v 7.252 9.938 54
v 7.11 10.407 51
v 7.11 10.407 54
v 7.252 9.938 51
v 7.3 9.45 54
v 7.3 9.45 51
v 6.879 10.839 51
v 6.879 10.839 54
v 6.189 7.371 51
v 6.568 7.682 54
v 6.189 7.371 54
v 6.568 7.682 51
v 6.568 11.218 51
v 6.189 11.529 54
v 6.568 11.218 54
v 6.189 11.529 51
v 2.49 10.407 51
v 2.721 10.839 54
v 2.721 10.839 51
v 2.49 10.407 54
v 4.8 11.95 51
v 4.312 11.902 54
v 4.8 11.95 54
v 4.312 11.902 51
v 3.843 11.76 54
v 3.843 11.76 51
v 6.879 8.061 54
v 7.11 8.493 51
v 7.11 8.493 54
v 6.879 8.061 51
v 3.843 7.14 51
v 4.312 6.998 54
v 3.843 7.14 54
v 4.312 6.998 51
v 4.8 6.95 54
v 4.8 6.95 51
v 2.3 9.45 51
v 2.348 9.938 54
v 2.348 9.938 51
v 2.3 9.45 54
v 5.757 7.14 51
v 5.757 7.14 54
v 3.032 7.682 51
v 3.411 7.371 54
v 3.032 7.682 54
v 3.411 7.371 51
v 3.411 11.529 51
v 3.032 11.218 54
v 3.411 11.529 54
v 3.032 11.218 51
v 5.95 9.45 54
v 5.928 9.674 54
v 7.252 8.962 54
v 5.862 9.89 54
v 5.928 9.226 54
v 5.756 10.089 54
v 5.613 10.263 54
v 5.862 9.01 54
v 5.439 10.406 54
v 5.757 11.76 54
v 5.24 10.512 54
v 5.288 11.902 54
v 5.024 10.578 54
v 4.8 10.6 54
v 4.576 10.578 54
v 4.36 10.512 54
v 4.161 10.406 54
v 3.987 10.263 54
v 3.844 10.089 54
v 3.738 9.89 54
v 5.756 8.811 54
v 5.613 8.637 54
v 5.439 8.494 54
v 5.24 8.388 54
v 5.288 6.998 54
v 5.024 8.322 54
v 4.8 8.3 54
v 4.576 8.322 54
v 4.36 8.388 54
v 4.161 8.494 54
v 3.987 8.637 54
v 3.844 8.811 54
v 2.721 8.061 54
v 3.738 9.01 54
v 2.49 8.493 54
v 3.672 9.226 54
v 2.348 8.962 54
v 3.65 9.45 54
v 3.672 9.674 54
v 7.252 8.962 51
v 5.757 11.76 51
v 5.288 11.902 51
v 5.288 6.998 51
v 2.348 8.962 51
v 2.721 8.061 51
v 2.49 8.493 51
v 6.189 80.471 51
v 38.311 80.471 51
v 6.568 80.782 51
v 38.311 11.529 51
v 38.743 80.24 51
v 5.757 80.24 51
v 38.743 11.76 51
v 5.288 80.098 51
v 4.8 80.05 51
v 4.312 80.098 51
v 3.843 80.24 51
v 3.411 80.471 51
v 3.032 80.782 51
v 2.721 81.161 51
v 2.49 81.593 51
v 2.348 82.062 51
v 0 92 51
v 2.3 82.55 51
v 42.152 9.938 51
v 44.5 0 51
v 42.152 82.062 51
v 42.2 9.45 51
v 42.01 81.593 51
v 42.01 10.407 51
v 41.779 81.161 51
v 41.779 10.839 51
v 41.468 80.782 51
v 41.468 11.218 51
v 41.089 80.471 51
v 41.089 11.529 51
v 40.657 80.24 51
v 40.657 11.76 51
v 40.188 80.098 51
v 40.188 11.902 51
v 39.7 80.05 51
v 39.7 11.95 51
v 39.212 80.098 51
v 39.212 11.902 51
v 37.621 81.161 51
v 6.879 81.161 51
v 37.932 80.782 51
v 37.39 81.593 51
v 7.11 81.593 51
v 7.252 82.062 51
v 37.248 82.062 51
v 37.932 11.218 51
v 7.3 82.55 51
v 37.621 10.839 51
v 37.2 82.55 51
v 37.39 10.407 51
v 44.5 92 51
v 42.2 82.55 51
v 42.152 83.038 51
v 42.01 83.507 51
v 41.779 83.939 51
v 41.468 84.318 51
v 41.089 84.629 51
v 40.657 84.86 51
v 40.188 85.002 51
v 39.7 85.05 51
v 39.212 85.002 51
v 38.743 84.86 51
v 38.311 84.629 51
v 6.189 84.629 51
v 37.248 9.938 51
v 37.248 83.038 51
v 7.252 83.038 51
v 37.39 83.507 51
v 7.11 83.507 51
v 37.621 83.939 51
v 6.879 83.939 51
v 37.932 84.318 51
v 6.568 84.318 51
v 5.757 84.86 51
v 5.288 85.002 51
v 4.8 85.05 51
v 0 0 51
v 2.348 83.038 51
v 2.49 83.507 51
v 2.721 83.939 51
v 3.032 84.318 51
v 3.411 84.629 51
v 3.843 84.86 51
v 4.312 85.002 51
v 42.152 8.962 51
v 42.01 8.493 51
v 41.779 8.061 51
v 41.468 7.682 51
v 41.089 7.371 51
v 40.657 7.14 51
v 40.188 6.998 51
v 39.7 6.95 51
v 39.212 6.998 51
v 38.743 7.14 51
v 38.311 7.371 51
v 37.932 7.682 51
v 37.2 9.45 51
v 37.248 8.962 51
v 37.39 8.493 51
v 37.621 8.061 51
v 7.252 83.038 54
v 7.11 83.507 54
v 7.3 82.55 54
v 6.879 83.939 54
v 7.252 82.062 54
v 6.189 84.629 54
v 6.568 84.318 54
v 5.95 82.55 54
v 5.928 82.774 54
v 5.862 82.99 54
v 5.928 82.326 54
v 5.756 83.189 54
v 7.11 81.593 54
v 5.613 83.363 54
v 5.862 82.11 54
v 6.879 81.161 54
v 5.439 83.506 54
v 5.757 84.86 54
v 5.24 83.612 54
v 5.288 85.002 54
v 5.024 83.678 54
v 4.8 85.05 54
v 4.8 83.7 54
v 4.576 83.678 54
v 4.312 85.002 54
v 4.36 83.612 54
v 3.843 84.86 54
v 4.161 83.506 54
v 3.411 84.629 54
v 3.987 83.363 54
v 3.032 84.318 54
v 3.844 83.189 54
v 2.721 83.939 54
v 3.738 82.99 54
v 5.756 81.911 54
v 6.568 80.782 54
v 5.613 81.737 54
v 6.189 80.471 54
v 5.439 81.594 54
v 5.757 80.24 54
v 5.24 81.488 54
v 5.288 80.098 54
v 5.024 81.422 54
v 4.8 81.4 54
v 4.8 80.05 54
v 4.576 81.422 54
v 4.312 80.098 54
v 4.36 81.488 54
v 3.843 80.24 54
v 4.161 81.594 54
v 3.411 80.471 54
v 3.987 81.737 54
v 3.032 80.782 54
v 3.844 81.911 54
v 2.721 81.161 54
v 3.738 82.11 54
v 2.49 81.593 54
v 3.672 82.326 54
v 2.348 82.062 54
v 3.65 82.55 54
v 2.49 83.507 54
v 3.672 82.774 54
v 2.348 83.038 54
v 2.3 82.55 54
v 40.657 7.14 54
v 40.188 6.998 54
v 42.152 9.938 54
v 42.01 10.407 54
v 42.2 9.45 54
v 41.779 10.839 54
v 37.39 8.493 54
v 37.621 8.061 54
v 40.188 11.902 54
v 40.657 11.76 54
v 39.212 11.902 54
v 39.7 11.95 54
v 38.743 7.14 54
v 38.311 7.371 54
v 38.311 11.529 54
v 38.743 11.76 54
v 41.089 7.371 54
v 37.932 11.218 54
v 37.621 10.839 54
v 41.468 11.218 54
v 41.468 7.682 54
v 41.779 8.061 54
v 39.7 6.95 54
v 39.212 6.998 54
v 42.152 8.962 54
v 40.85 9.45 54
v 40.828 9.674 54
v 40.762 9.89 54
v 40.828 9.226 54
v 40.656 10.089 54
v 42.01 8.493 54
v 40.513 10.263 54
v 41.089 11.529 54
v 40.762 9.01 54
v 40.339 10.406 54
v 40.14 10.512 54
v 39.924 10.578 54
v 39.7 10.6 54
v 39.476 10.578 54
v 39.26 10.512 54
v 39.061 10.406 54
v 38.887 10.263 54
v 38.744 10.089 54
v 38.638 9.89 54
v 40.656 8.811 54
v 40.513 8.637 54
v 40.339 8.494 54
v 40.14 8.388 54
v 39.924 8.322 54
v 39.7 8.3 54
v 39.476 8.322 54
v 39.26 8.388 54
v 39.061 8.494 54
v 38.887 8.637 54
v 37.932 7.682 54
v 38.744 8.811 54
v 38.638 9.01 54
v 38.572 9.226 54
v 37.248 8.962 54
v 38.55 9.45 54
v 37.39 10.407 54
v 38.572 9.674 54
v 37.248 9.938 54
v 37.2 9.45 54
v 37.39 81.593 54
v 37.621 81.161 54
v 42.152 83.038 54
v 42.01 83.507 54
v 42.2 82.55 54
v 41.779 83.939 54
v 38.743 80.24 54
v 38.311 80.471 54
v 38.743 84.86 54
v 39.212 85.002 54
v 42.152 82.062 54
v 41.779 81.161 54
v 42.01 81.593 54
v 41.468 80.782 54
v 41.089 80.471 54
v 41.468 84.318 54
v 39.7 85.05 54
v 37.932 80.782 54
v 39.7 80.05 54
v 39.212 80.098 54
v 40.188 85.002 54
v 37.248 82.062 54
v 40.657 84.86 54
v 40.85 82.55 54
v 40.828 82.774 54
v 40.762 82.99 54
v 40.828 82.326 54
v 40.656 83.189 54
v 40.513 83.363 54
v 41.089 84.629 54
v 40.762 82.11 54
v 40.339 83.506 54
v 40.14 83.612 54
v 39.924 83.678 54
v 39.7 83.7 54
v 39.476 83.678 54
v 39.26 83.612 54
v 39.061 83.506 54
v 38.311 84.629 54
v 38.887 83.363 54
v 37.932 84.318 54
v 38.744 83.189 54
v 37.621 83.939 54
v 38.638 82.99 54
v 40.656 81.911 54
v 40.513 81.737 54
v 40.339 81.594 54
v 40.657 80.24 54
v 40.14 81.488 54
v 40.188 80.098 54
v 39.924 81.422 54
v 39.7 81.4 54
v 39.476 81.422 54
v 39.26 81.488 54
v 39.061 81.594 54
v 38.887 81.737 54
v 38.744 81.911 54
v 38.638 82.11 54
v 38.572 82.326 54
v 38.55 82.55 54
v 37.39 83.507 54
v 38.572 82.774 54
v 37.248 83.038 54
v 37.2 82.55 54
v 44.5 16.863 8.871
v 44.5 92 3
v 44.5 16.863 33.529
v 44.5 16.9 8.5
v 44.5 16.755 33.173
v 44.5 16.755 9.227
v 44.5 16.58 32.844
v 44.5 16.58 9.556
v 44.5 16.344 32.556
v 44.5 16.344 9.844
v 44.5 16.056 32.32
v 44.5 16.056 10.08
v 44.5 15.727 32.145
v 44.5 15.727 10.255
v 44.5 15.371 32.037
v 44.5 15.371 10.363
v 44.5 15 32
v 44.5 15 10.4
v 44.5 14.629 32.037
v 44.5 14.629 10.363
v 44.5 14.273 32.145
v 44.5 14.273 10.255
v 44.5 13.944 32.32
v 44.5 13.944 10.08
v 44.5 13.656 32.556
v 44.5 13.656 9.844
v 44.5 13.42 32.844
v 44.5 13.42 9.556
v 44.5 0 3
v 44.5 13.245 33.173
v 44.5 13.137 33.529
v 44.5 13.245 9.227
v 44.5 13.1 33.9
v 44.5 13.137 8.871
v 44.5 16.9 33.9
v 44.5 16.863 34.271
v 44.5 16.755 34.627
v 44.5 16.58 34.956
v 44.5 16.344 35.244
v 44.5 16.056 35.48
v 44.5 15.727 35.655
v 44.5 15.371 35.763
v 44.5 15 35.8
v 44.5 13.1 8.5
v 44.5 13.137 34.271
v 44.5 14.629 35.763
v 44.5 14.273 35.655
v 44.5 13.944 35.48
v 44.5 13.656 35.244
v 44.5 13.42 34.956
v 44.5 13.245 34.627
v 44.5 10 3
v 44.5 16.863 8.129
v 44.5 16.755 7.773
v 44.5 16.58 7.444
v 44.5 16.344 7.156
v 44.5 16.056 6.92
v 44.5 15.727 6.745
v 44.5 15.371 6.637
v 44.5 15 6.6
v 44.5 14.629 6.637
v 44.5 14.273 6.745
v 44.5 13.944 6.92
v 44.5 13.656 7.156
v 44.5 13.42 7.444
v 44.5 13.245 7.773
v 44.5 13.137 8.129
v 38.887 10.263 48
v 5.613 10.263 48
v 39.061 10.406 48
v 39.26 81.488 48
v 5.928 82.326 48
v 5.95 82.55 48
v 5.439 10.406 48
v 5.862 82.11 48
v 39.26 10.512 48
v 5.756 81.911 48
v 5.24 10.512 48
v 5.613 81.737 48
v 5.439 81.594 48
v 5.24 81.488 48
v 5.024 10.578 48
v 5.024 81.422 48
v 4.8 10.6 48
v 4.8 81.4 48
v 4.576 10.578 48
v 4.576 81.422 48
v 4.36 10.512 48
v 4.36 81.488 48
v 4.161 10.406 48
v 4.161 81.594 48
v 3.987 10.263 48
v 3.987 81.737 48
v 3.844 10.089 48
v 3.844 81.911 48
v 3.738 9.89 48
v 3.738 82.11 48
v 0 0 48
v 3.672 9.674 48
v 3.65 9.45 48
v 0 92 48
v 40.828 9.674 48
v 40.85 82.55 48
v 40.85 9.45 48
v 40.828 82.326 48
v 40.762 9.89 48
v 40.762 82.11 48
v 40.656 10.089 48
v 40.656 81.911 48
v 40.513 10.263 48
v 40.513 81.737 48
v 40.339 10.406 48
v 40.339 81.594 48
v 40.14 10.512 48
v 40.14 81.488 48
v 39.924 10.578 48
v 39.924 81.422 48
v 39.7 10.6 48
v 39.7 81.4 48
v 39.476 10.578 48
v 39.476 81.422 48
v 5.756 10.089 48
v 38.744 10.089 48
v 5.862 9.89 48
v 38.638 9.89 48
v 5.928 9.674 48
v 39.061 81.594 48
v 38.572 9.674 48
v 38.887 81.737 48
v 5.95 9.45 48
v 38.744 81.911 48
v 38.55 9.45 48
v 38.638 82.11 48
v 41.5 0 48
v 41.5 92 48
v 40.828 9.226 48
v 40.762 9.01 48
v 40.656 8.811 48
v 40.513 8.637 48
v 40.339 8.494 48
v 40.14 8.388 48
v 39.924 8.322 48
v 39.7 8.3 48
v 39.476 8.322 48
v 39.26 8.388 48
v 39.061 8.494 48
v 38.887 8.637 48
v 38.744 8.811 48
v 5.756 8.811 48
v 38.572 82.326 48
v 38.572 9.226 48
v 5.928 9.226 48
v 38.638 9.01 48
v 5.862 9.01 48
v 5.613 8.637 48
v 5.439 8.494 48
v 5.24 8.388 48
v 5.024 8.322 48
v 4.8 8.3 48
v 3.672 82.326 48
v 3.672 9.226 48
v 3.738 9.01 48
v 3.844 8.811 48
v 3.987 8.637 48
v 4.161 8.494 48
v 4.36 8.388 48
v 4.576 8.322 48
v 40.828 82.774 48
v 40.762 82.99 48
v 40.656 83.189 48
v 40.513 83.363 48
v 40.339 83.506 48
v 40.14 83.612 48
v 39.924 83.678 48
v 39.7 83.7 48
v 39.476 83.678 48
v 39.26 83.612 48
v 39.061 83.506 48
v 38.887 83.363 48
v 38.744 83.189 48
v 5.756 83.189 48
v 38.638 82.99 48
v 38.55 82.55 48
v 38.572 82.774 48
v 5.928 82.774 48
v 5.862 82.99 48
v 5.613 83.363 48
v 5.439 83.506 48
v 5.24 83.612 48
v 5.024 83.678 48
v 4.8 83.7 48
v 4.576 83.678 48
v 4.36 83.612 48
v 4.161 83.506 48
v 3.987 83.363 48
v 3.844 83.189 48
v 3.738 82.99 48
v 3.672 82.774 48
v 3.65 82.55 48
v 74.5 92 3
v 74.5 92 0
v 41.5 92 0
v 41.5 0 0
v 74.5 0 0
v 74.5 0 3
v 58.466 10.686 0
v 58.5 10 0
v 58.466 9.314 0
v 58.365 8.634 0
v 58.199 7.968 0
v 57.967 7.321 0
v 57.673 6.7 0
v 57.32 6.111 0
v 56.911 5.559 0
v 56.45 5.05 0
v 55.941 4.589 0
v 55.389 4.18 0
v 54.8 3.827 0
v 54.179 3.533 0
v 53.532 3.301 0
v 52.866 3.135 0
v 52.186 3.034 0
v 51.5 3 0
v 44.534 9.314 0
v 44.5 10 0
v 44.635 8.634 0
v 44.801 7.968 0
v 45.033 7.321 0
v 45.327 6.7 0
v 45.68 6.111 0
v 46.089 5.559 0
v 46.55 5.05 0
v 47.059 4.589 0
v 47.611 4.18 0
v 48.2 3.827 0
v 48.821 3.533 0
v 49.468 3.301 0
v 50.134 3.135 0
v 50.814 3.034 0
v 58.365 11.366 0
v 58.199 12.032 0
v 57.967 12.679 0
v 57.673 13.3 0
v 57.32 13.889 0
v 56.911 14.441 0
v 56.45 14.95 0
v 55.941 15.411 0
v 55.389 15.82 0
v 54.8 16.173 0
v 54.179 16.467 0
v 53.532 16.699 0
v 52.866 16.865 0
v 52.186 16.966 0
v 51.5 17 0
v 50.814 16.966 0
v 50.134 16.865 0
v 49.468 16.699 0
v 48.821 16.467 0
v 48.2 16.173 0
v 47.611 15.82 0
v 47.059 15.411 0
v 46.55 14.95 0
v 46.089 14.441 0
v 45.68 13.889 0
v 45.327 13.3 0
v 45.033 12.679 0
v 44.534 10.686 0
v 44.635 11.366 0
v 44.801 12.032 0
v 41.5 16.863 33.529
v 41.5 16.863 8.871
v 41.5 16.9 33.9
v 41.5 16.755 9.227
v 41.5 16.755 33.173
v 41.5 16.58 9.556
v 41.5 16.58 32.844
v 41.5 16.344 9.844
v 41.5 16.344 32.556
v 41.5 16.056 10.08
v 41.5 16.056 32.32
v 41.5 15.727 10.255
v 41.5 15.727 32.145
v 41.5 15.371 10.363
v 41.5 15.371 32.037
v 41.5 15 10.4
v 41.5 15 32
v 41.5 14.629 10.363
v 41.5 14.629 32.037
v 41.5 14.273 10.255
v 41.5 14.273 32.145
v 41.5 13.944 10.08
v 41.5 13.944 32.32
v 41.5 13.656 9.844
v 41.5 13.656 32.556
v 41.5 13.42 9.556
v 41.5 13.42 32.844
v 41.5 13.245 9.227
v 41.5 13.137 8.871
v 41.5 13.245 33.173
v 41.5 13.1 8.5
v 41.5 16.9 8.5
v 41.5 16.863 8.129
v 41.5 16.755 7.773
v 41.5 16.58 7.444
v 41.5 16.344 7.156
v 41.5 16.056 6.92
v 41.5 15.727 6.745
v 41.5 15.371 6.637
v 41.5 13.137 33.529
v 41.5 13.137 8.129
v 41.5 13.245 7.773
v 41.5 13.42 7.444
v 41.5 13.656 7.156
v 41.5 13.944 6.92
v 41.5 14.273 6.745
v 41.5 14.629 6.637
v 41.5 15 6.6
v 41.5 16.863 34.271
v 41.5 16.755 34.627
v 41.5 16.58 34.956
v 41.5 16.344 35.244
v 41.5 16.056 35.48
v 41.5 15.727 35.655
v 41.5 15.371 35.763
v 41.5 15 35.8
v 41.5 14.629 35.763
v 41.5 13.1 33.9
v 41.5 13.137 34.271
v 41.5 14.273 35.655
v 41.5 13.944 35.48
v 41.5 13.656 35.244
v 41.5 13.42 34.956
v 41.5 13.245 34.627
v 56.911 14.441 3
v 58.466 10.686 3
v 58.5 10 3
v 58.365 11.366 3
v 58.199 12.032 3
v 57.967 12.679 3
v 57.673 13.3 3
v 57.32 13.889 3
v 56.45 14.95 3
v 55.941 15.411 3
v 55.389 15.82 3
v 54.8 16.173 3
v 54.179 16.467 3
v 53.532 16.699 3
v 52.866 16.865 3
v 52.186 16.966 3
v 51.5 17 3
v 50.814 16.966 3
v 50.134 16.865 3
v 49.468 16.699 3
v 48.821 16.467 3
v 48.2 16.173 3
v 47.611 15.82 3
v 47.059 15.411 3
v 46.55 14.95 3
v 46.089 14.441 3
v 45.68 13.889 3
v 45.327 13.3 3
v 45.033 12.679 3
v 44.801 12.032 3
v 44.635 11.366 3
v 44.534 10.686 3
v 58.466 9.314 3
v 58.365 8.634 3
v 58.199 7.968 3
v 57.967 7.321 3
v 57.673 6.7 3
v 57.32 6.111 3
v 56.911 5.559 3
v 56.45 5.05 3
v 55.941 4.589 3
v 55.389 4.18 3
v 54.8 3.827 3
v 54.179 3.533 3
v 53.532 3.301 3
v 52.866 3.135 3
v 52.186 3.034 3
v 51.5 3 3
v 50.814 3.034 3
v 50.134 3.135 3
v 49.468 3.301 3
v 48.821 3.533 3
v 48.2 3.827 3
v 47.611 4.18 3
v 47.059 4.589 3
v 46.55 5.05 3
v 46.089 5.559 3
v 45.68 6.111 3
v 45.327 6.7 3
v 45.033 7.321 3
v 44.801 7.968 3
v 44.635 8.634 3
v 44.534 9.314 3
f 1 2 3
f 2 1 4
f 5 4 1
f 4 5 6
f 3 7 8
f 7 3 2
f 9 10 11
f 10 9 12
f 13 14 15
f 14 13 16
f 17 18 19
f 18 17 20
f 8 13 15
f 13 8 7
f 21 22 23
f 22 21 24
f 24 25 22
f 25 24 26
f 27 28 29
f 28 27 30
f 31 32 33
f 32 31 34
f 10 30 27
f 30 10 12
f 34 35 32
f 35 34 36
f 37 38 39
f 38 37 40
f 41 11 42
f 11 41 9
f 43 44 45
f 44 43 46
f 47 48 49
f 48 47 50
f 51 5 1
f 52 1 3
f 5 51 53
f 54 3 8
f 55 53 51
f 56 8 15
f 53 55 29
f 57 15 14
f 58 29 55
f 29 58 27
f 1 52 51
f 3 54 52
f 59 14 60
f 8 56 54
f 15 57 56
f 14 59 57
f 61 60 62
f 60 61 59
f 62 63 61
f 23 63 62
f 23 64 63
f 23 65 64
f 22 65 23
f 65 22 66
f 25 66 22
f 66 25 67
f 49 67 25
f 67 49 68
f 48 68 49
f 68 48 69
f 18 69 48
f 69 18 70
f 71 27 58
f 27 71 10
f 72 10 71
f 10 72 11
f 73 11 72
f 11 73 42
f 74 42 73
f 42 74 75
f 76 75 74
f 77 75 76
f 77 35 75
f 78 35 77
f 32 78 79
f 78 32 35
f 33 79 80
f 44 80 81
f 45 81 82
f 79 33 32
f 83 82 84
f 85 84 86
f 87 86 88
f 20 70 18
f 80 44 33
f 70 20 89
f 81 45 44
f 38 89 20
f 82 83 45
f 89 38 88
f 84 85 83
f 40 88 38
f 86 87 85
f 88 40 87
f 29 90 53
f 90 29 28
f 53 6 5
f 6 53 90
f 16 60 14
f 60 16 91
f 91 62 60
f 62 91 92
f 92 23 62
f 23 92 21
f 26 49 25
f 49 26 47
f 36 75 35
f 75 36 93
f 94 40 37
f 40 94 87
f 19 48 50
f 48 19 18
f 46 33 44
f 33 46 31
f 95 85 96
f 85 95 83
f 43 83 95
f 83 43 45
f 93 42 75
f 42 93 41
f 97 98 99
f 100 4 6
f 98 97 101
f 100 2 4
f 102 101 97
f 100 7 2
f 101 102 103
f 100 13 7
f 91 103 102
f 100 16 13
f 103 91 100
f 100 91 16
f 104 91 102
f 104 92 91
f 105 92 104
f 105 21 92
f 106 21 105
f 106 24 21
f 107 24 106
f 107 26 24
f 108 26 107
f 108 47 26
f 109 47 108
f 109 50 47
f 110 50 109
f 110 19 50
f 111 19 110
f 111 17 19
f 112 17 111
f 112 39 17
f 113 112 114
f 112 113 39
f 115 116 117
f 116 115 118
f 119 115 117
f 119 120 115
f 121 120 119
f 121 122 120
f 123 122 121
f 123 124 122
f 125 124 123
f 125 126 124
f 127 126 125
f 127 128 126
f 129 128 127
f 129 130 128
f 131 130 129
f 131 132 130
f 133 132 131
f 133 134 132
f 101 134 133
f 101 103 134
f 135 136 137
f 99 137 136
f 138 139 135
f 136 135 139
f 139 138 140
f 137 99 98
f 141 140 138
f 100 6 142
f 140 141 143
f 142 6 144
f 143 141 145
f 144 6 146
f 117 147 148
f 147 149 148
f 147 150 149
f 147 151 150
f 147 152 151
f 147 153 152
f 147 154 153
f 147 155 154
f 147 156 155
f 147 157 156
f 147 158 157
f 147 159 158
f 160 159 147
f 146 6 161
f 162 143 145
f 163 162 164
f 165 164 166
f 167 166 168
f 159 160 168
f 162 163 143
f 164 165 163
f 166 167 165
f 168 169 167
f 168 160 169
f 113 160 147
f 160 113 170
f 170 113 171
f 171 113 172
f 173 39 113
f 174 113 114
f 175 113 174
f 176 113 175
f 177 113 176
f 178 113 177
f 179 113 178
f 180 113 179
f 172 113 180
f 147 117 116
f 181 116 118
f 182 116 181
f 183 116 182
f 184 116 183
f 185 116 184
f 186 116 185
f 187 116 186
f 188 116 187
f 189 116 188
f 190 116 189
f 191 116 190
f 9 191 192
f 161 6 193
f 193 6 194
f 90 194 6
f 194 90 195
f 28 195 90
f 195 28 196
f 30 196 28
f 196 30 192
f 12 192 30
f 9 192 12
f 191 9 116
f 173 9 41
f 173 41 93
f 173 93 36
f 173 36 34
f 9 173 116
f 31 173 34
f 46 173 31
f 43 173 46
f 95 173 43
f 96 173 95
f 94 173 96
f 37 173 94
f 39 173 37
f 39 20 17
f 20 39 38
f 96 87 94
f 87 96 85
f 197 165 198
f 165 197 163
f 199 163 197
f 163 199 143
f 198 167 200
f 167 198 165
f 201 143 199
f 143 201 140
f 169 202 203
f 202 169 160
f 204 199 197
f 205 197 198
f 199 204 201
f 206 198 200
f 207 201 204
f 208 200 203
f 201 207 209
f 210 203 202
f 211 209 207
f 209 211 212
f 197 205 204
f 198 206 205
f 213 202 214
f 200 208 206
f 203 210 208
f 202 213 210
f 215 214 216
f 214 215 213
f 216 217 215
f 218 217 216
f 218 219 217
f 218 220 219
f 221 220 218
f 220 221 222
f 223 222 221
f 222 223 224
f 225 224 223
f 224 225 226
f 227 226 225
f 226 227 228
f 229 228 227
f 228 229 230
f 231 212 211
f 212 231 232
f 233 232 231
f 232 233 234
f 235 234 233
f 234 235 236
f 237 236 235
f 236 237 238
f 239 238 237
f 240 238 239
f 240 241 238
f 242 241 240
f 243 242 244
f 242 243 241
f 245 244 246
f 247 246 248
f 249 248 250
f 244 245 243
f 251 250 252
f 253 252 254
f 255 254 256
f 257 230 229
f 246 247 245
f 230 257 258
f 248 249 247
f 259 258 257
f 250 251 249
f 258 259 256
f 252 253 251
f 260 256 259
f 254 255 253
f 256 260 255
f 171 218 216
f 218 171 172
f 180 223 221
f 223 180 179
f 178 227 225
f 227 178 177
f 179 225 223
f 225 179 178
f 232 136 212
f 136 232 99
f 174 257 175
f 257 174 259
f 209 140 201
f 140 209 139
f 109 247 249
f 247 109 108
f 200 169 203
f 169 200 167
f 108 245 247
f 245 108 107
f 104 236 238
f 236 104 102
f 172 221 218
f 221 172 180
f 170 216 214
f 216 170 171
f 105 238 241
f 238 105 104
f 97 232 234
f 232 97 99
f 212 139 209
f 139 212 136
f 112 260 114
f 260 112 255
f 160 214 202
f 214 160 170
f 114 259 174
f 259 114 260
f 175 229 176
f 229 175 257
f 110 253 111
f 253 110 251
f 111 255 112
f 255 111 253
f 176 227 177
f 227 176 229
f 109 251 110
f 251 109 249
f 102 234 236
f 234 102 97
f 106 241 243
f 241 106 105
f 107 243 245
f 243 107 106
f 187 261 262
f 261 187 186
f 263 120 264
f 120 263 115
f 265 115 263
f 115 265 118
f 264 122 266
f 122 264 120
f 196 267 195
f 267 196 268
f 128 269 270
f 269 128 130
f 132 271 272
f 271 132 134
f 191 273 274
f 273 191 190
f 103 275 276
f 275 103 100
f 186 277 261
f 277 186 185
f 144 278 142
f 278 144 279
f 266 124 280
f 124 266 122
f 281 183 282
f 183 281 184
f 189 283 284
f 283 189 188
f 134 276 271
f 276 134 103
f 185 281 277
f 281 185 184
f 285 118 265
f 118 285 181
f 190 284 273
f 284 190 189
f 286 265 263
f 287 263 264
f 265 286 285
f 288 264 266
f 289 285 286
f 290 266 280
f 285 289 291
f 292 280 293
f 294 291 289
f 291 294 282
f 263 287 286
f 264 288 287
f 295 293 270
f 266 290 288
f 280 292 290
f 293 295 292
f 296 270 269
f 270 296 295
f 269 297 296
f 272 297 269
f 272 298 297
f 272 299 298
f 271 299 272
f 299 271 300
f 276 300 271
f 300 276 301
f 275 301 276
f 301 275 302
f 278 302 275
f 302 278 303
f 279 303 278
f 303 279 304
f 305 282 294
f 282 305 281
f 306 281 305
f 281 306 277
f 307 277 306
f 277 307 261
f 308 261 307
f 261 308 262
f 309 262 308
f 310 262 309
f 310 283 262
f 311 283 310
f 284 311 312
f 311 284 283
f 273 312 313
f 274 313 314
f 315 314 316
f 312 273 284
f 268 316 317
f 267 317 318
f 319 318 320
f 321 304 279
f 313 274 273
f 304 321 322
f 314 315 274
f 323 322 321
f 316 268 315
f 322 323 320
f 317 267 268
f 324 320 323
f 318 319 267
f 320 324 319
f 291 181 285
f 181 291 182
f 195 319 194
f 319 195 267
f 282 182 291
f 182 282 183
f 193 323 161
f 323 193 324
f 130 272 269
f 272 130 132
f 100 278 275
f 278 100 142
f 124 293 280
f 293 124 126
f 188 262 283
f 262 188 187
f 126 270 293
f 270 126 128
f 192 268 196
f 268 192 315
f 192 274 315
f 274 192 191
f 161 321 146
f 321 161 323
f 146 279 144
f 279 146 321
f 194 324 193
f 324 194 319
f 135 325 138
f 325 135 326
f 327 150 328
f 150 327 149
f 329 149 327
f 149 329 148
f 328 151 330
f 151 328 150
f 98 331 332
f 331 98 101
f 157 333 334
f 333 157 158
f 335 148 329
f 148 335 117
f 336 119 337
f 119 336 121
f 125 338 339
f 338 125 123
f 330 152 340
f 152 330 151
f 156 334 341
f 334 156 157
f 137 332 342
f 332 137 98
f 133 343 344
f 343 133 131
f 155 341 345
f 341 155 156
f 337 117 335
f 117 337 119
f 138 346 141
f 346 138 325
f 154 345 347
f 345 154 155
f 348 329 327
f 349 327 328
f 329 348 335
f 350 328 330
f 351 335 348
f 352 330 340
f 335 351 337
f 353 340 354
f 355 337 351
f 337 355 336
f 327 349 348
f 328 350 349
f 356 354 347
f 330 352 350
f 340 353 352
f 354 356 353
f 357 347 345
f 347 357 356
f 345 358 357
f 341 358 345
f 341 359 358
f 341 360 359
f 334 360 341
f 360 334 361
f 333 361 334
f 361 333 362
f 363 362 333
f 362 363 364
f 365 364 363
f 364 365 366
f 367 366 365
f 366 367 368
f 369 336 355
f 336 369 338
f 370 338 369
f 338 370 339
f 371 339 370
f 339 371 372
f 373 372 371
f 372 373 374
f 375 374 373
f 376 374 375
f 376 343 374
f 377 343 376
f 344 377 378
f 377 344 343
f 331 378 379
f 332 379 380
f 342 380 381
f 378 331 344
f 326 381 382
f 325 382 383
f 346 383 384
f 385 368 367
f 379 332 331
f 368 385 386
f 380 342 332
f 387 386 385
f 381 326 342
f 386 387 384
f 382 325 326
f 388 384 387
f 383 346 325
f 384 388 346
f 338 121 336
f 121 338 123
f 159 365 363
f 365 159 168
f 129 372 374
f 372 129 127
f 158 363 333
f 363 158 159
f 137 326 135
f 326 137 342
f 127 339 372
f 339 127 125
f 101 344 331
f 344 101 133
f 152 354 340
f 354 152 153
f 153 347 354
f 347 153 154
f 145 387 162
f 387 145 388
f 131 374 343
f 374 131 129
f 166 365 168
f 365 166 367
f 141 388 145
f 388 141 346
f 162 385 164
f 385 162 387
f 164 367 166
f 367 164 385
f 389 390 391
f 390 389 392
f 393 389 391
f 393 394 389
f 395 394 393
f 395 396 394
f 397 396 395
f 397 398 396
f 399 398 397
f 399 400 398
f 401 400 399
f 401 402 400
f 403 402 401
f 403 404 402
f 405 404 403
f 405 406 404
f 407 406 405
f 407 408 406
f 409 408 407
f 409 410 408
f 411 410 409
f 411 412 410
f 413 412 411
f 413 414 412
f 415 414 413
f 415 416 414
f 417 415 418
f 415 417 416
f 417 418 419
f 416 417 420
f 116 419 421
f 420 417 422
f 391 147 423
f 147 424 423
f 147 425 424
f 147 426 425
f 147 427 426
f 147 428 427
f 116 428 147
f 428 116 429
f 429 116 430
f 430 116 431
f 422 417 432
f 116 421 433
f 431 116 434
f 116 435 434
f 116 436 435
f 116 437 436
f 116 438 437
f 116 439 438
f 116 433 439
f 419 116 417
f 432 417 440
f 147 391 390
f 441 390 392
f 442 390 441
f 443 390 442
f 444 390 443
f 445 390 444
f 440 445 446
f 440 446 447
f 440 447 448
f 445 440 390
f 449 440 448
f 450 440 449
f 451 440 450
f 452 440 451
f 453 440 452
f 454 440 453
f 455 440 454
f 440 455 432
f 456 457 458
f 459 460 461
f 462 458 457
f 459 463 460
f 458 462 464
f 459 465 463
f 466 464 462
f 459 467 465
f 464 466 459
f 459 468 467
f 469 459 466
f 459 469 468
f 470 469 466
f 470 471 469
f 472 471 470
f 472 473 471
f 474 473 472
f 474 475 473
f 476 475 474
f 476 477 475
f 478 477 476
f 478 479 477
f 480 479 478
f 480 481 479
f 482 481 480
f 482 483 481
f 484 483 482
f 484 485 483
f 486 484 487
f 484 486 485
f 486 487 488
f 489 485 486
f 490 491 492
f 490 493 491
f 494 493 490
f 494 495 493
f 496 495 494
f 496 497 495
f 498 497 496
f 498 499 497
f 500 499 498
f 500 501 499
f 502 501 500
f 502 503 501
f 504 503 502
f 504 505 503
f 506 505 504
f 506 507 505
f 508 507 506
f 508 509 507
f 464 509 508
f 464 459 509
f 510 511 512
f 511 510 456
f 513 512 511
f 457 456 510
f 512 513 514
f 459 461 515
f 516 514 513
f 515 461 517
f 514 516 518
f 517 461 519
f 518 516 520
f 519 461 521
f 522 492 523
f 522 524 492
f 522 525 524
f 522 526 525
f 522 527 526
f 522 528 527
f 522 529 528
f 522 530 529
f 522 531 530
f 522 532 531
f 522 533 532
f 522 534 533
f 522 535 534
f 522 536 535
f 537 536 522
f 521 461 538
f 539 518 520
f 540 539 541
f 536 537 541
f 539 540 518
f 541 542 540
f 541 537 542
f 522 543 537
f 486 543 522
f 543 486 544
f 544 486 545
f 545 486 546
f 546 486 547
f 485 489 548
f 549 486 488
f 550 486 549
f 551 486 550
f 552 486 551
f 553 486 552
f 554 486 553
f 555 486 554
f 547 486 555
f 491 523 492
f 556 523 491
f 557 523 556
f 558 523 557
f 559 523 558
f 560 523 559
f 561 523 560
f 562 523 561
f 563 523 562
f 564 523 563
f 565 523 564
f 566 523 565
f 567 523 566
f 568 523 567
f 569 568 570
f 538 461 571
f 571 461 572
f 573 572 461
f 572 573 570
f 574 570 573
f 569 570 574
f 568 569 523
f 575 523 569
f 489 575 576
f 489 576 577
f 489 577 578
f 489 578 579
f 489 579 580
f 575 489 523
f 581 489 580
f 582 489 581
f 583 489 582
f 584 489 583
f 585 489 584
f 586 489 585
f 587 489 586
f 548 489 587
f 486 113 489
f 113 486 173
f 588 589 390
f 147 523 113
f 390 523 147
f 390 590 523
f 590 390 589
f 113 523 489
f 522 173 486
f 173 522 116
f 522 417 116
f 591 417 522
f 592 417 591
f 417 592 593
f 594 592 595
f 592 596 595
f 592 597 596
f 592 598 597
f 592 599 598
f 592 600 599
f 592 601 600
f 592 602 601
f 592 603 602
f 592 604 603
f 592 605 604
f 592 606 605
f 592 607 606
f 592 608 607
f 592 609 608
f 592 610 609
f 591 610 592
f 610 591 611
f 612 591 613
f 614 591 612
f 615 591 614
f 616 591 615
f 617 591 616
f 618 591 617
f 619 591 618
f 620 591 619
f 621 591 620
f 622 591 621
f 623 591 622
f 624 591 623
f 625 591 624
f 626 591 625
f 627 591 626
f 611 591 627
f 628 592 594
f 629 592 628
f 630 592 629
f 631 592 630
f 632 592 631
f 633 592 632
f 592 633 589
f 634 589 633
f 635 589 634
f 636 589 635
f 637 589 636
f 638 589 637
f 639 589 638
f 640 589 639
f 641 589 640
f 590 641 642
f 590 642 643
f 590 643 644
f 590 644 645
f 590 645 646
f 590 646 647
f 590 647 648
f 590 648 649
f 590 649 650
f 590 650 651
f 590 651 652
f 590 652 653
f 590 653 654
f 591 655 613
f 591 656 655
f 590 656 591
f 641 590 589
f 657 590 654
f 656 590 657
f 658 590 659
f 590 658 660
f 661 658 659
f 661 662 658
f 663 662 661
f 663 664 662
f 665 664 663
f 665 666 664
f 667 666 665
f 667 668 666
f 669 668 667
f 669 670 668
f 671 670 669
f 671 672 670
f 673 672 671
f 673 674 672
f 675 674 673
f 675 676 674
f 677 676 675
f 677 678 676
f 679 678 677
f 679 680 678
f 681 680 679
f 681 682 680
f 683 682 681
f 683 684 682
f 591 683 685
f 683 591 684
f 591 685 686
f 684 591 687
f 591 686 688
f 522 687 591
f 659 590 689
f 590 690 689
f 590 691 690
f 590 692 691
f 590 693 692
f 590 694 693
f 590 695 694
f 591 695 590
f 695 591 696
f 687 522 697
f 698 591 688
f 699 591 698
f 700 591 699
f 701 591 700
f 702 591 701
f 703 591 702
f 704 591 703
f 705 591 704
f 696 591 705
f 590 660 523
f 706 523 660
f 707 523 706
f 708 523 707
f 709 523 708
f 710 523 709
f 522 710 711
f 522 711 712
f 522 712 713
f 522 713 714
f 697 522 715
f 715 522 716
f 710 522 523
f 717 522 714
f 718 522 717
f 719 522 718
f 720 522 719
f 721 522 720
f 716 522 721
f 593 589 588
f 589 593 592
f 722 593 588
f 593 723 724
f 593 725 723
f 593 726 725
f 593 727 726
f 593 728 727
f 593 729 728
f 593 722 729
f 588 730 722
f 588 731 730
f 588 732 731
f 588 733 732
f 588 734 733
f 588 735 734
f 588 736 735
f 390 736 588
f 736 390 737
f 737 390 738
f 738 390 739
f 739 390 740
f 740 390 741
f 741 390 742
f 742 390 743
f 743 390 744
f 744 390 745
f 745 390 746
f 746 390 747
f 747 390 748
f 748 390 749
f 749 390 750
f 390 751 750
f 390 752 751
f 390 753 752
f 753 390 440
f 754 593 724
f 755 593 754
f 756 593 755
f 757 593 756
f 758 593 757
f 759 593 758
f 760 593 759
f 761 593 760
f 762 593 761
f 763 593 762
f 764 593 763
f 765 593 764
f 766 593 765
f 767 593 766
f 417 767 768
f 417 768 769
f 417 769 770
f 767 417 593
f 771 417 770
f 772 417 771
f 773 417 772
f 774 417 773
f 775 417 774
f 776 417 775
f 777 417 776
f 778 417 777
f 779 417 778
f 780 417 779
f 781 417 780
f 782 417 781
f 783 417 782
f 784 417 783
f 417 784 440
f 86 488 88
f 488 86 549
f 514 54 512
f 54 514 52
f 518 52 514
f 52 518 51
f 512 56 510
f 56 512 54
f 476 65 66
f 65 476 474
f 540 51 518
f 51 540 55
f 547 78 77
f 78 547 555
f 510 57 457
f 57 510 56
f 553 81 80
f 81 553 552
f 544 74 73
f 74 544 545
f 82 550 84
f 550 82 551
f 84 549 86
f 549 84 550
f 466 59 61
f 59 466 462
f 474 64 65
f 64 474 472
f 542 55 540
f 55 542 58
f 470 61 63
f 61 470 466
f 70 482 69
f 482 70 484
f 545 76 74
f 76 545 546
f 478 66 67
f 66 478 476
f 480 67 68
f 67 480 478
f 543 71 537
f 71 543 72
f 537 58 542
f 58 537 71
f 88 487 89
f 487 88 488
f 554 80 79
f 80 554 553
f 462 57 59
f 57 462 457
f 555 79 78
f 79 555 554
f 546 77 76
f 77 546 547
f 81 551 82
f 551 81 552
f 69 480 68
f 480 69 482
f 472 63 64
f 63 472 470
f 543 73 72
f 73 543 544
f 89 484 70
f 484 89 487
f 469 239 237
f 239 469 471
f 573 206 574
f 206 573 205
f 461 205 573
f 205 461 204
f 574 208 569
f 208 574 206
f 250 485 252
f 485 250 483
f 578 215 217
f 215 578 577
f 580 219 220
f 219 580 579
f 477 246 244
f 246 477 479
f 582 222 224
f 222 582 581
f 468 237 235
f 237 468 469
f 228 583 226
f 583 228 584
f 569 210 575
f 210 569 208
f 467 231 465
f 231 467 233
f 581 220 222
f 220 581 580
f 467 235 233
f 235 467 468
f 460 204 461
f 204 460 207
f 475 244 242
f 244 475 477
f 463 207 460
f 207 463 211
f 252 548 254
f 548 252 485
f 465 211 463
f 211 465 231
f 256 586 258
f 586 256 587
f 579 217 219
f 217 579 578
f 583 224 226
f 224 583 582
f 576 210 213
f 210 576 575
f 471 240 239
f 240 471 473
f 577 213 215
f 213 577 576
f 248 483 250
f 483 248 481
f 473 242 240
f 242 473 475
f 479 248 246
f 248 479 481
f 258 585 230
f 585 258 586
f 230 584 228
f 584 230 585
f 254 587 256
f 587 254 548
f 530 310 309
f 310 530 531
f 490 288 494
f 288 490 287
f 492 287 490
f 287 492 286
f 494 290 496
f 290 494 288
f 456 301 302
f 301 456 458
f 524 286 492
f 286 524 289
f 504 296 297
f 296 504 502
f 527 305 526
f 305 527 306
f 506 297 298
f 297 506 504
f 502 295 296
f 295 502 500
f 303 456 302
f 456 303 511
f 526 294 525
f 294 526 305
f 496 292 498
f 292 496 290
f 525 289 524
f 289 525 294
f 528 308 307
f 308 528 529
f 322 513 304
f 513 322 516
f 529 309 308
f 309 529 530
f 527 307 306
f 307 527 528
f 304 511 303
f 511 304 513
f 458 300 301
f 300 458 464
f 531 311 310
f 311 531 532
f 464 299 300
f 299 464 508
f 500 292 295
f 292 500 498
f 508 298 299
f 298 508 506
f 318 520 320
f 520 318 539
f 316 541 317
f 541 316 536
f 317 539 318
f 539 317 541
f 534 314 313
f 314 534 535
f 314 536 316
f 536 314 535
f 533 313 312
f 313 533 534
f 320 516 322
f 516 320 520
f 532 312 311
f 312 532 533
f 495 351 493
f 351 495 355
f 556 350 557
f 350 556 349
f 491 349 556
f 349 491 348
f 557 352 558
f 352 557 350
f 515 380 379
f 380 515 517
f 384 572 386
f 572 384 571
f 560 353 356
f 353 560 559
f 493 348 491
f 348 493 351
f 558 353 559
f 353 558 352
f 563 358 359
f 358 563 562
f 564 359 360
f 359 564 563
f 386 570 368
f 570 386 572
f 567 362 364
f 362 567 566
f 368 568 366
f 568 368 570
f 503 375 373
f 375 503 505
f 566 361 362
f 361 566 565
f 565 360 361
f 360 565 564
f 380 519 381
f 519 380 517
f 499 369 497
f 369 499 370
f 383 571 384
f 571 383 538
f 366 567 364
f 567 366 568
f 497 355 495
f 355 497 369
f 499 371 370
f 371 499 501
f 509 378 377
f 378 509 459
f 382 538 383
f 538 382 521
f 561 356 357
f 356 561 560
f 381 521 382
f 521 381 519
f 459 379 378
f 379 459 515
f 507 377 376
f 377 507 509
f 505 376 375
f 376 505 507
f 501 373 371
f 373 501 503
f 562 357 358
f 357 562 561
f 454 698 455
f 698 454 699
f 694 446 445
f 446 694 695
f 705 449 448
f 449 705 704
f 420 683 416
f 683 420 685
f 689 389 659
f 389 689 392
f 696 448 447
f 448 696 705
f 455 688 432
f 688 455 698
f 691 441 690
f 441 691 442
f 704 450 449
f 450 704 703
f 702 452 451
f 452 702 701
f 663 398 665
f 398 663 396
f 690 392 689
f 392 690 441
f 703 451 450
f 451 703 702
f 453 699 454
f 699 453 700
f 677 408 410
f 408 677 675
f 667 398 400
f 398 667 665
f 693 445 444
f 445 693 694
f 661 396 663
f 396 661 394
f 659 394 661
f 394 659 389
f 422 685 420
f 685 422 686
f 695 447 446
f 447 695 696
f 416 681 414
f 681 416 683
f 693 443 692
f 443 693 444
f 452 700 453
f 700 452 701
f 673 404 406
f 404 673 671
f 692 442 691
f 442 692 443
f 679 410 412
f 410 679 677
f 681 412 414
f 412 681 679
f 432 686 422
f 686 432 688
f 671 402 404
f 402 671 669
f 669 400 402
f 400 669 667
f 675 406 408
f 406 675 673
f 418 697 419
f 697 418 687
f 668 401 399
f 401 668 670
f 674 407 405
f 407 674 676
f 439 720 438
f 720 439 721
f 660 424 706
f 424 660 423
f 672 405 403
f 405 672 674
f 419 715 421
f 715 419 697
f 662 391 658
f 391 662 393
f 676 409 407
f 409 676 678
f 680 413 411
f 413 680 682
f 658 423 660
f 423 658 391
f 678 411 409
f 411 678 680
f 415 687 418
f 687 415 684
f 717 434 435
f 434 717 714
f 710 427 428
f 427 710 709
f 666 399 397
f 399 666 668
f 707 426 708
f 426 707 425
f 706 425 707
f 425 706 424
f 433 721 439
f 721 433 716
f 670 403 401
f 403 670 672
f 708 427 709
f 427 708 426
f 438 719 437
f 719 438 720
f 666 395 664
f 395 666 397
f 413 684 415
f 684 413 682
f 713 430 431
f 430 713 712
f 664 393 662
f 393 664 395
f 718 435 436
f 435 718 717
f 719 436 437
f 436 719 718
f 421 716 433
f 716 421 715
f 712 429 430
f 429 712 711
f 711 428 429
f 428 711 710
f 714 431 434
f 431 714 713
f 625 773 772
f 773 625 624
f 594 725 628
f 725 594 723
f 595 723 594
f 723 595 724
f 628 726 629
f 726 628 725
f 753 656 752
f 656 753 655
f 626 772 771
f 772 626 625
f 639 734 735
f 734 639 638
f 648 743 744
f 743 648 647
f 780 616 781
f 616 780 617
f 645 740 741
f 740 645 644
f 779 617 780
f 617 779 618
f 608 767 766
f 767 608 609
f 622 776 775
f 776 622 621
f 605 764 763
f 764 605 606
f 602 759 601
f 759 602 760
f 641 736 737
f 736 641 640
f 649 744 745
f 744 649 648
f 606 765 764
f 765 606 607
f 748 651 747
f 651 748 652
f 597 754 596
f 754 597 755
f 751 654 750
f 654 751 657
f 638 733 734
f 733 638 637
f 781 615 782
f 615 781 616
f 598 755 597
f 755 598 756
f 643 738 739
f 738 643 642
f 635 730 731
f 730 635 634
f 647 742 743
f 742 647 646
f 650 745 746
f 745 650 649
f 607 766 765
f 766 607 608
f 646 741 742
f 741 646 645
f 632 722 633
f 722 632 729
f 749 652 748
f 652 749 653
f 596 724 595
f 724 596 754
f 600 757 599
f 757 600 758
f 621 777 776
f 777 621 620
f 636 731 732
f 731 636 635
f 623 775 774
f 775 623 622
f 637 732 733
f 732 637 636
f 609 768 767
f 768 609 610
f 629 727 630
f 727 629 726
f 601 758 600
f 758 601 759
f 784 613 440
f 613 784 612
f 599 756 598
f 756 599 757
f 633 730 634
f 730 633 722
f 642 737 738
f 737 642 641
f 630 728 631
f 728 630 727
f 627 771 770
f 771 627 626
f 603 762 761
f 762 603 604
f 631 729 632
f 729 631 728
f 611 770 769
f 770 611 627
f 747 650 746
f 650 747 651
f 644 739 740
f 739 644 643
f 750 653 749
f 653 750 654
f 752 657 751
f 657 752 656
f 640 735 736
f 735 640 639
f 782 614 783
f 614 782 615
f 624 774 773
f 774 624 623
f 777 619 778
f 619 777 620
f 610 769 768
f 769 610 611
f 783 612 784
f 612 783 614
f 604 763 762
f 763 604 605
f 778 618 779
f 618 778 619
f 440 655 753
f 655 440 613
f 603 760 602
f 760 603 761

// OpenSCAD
// TritonECU — PSU mounting platform
// A Z-bracket. The module bolts down onto the UPPER flange (the one carrying
// the four 2 mm holes); the LOWER flange is the foot that fixes the bracket to
// whatever it stands on. Built from the hand drawing of 2026-09-19.
//
//   render one part at a time:  part = "platform"
//
//                     up_w 44.5
//            |<------------------------>|
//            +---------------------------+   ---
//            |  o                     o  | |  t     <- upper flange, holes here
//            +------------------------+--+   ---
//                                     |##|
//                                     |##|         <- web, t thick
//                              height |##| 51
//                                     |##|
//                                  +--+--+--------------+   ---
//                                  |                    | |  t  <- lower flange
//                                  +--------------------+   ---
//                                  |<------------------>|
//                                        lo_w 30
//
//   Total width  = up_w + lo_w = 74.5.  The web is the last t of up_w, which is
//   the only reading under which the two rectangles in the top view meet at one
//   line AND sum to the outside width. See README.md.

part = "platform";

/* Tessellation. Chord error is r*(1-cos(180/n)); a 2 mm hole at fn 32 is off by
   0.0024 mm, which is three orders below what the printer resolves. Holes are
   the only curved feature in the part, so there is nothing to economise on. */
$fn      = 32;
hole_fn  = 32;

/* ---------------------------------------------------------------------------
   FROM THE DRAWING — every number here is dimensioned on the sketch
   --------------------------------------------------------------------------- */
up_w    = 44.5;  // upper flange: outer tip to the OUTER face of the web
lo_w    = 30.0;  // lower flange: outer face of the web to its outer tip
height  = 51.0;  // OVERALL: top of the upper flange to the bottom of the lower
deep    = 92.0;  // both flanges, the depth of the extrusion

hole_d  =  2.0;  // "2 mm holes", dimensioned to hole CENTRES
hole_dx = 34.9;  // centre-to-centre, across the upper flange
hole_dy = 73.1;  // centre-to-centre, along the 92

/* ---------------------------------------------------------------------------
   NOT ON THE DRAWING — decisions, change them freely
   --------------------------------------------------------------------------- */

/* Plate and web thickness. The drawing shows a ribbon of constant thickness but
   never says how thick. 3 mm is the same as this repo's other printed plate.
   The web is the part that carries load: as a 92 x 3 plate its section modulus
   is b*t^2/6 = 138 mm^3, and a load on the middle of the upper flange acts at
   22.25 mm, so at a conservative 20 MPa for printed PETG it takes 124 N — about
   12 kg. The height does not enter that: a vertical load's moment at the root is
   set by the offset, not by how tall the web is. 3 mm is not the weak part. */
t         = 3.0;

/* Printed holes come out undersize by 0.2-0.4 mm on diameter — the first layer
   of the bore squashes inward. Same compensation as hardware/carrier-template.
   Set this to 0 if you want the model to carry the nominal 2.0 and intend to
   drill. A 2.0 mm hole modelled at 2.0 prints at roughly 1.7 and a 2 mm screw
   will not pass it. */
hole_comp = 0.30;

/* Hole pattern origin — the centre of the hole nearest the origin. The default
   centres the 34.9 x 73.1 pattern in the 44.5 x 92 flange, which is what the
   sketch shows to the accuracy a sketch has. If the real module's pattern is not
   centred, set these two and nothing else changes. */
hole_x0   = (up_w - hole_dx) / 2;   // 4.80
hole_y0   = (deep - hole_dy) / 2;   // 9.45

/* Standoffs on the four holes. The module bolts down onto the UPPER flange, so
   these sit on its TOP face and lift the module clear of it — the usual reason
   being solder tails or components on the underside of the module's board.

   HEIGHT is the defining dimension: "3 mm standoff" means 3 mm of lift. It is
   not the diameter — a 3 mm OD boss around a 2.3 mm bore would leave a 0.35 mm
   wall, which is under two extrusion widths and would neither print nor hold.
   5 mm OD gives a 1.35 mm wall and a proper seat for an M2 head (~3.8 mm A/F). */
standoff   = true;
standoff_h = 3.0;   // lift above the upper flange
standoff_d = 5.0;   // OD; see the wall-thickness check in the echoes

/* Clearance for the module's own ~13 mm standoff. The sketch of 2026-09-19 puts
   a circle in the LOWER flange (the foot), tangent to the fold line and near one
   end of the 92 — that is the plan position of a boss on the module's underside,
   so the foot has to be holed to clear it rather than sit on it.

   x is derived, not dimensioned: the drawn circle touches the fold line, so the
   centre is one radius outboard of it. y was scaled off the sketch at about 8 mm
   from the end, which would leave ~1 mm of plate; it is set to 10 here so the
   margin is 3. Set psu_cut_y from the real module and read the margin echo. */
psu_cut       = true;
psu_cut_d     = 13.0;   // the standoff itself, as measured off the module
psu_cut_clear =  1.0;   // added to DIAMETER: the hole is 14.0
psu_cut_y     = 10.0;   // centre, from the y = 0 end of the 92
psu_cut_x     = 0;      // 0 = derive it, tangent to the fold; else an absolute x
cut_fn        = 64;     // a 14 mm bore at 32 is 0.034 mm off; at 64 it is 0.008

/* The Ø3.5 pair in the WEB — the same holes hardware/l-bracket carries in its
   upright, and the same 25.4 between centres. Two differences, both asked for:
   they are NOT on the midline of the 92, and the lower one is measured from the
   bottom of the FOOT rather than from a free end, because this web has no free
   end — it lands on the lower flange.

   side_y is "15 mm from the right side, looking at the face straight on", read
   as standing on the UPPER FLANGE'S side (x = -) and looking toward +x, which
   puts the viewer's right at y = 0. That is the same end of the 92 as the Ø14
   standoff cut in the foot. If "right" meant the other end, set
   side_y = deep - 15 = 77 and nothing else changes. */
side_holes = true;
side_d     =  3.5;   // nominal; modelled at 3.80 with the same compensation
side_dz    = 25.4;   // centre to centre, up the web
side_z0    =  8.5;   // LOWER centre, up from z = 0 — the underside of the foot
side_y     = 15.0;   // from the y = 0 end of the 92

/* Optional corner ribs. OFF by default because the drawing has none and the
   web does not need them (see the 12 kg above). Turn them on if the load is
   ever sideways rather than down — that is the case the flat web is poor at. */
gusset    = false;
gusset_n  = 2;      // ribs per corner, spread along the 92
gusset_t  = 2.4;    // 3 perimeters at 0.4 mm line width, solid
gusset_l  = 12;     // how far the rib reaches along each leg

/* ---------------------------------------------------------------------------
   Geometry
   --------------------------------------------------------------------------- */
hole_r = (hole_d + hole_comp) / 2;
web_x  = up_w - t;          // inner face of the web
total_w = up_w + lo_w;

/* The fold line — where the two rectangles of the top view meet — is at up_w.
   The web hangs BELOW the upper flange from web_x to up_w, so a cut tangent to
   the fold does not touch it. */
cut_d  = psu_cut_d + psu_cut_clear;
cut_x  = (psu_cut_x > 0) ? psu_cut_x : up_w + cut_d / 2;
side_r = (side_d + hole_comp) / 2;

module ribs(x, z, dx, dz) {
    // A right triangle in X-Z, extruded along Y, repeated along the depth.
    for (i = [0 : gusset_n - 1]) {
        y = deep * (i + 0.5) / gusset_n - gusset_t / 2;
        translate([x, y, z])
            rotate([90, 0, 0])
                rotate([0, 0, 0])
                    translate([0, 0, -gusset_t])
                        linear_extrude(gusset_t)
                            polygon([[0, 0], [dx, 0], [0, dz]]);
    }
}

module platform() {
    difference() {
        union() {
            // upper flange — overlaps the web, so the union is solid, not a
            // pair of coincident faces
            translate([0, 0, height - t])   cube([up_w, deep, t]);
            // web, full height: it has to reach z=0, or its joint to the lower
            // flange is a line of zero area
            translate([web_x, 0, 0])        cube([t, deep, height]);
            // lower flange — starts at the web's INNER face for the same reason
            translate([web_x, 0, 0])        cube([lo_w + t, deep, t]);

            // standoffs, on TOP of the upper flange, bored through below
            if (standoff)
                for (i = [0, 1], j = [0, 1])
                    translate([hole_x0 + i * hole_dx,
                               hole_y0 + j * hole_dy, height])
                        cylinder(h = standoff_h, d = standoff_d, $fn = hole_fn);

            if (gusset) {
                // under the upper flange, reaching inboard along its underside
                ribs(web_x, height - t, -gusset_l, -gusset_l);
                // above the lower flange, reaching outboard
                ribs(up_w, t, gusset_l, gusset_l);
            }
        }
        // the four 2 mm holes — through the upper flange AND any standoff on it
        for (i = [0, 1], j = [0, 1])
            translate([hole_x0 + i * hole_dx, hole_y0 + j * hole_dy, height - t - 1])
                cylinder(h = t + (standoff ? standoff_h : 0) + 2, r = hole_r,
                         $fn = hole_fn);

        // clearance for the module's ~13 mm standoff — through the LOWER flange
        if (psu_cut)
            translate([cut_x, psu_cut_y, -1])
                cylinder(h = t + 2, d = cut_d, $fn = cut_fn);

        // the Ø3.5 pair — through the WEB, axis along X
        if (side_holes)
            for (k = [0, 1])
                translate([web_x - 1, side_y, side_z0 + k * side_dz])
                    rotate([0, 90, 0])
                        cylinder(h = t + 2, r = side_r, $fn = hole_fn);
    }
}

if (part == "platform") platform();

/* ---------------------------------------------------------------------------
   Checks — these print on every render, so they follow the parameters rather
   than the README
   --------------------------------------------------------------------------- */
echo(str("outside              ", total_w, " x ", deep, " x ", height, " mm"));
echo(str("upper flange         ", up_w, " x ", deep, ", holes in this one"));
echo(str("lower flange         ", lo_w, " x ", deep, " (", lo_w + t, " incl. web)"));
echo(str("plate/web thickness   ", t));
echo(str("hole modelled dia     ", hole_d + hole_comp, "  (nominal ", hole_d,
         " + ", hole_comp, " print compensation)"));
echo(str("hole centres  x       ", hole_x0, " and ", hole_x0 + hole_dx));
echo(str("hole centres  y       ", hole_y0, " and ", hole_y0 + hole_dy));
echo(str("edge margin to tip    ", hole_x0 - hole_r, " mm"));
echo(str("edge margin in y      ", hole_y0 - hole_r, " mm"));
echo(str("CLEARANCE, inboard hole to web face  ",
         web_x - (hole_x0 + hole_dx + hole_r),
         " mm  <-- a screw HEAD will not fit here, see README"));
echo(str("bed footprint, printed on end  ", total_w, " x ", height,
         "  and ", deep, " tall"));
if (side_holes) {
    echo(str("Ø", side_d, " pair in the web   modelled dia ", side_d + hole_comp,
             "  (", side_d, " + ", hole_comp, ")"));
    echo(str("  centres  z         ", side_z0, " and ", side_z0 + side_dz,
             "  up from the underside of the foot,  y ", side_y));
    echo(str("  y is measured from the y = 0 end; the other end is at ",
             deep - side_y, ". Flip with side_y = ", deep - side_y, "."));
    echo(str("  web either side of them  ", side_y - side_r, " and ",
             deep - side_y - side_r, " mm"));
    echo(str("  lower bore clears the foot's TOP face by ",
             side_z0 - side_r - t, " mm",
             ((side_z0 - side_r - t) < 0)
               ? "  <-- BREAKS INTO the foot" : "  (ok)"));
    echo(str("  an M3.5 washer on the lower hole reaches down to z ",
             side_z0 - 3.75, ";  the foot's top face is at ", t,
             ((side_z0 - 3.75) < t) ? "  <-- washer fouls the foot" : "  (clears)"));
    echo(str("  upper bore to the underside of the upper flange  ",
             (height - t) - (side_z0 + side_dz + side_r), " mm"));
    echo(str("  same end as the standoff cut? cut y = ", psu_cut_y,
             ", holes y = ", side_y,
             (abs(psu_cut_y - side_y) < 20) ? "  (yes, same end)" : "  (opposite ends)"));
}
if (psu_cut) {
    echo(str("standoff clearance    ", cut_d, " dia through the LOWER flange  (",
             psu_cut_d, " standoff + ", psu_cut_clear, " on diameter)"));
    echo(str("  centre              x ", cut_x, "  y ", psu_cut_y));
    echo(str("  gap to the fold     ", cut_x - cut_d / 2 - up_w, " mm",
             ((cut_x - cut_d / 2 - up_w) < 0)
               ? "  <-- EATS INTO the upper flange / web" : "  (tangent = 0)"));
    echo(str("  plate left to the y=0 end   ", psu_cut_y - cut_d / 2, " mm",
             ((psu_cut_y - cut_d / 2) < 2)
               ? "  <-- UNDER 2 mm, a sliver: move psu_cut_y out or open the"
                 + " cut to the edge" : "  (ok)"));
    echo(str("  plate left to the outer tip ", total_w - (cut_x + cut_d / 2),
             " mm"));
    echo(str("  the foot's joint to the web is interrupted for ", cut_d,
             " of the ", deep, " — the other ", deep - cut_d, " still carry it"));
    if (gusset && abs(psu_cut_y - (deep * 0.5 / gusset_n)) < cut_d / 2 + gusset_t)
        echo("  <-- a GUSSET rib lands on this cut; move one or the other");
}
if (standoff) {
    echo(str("standoffs             4 x ", standoff_d, " dia x ", standoff_h,
             " tall, on the upper flange's TOP face"));
    echo(str("  wall around bore    ", (standoff_d - (hole_d + hole_comp)) / 2,
             " mm",
             ((standoff_d - (hole_d + hole_comp)) / 2 < 0.8)
               ? "  <-- UNDER 2 extrusion widths, raise standoff_d" : "  (ok)"));
    echo(str("  screw length now    module thickness + ", standoff_h + t,
             " mm before any thread engages (was ", t, ")"));
    echo(str("  overall height      ", height + standoff_h,
             " mm to the standoff tips (part itself is still ", height, ")"));
    echo(str("  outboard standoff to flange tip  ",
             hole_x0 - standoff_d / 2, " mm",
             (hole_x0 - standoff_d / 2 < 0) ? "  <-- OVERHANGS the edge" : ""));
    echo(str("  inboard standoff to web outer face  ",
             (up_w) - (hole_x0 + hole_dx + standoff_d / 2), " mm",
             ((up_w) - (hole_x0 + hole_dx + standoff_d / 2) < 0)
               ? "  <-- OVERHANGS the edge" : ""));
    echo("  NOTE: standoffs do not change the 124 N / 12 kg web figure — a");
    echo("        vertical load's moment is set by the 22.25 mm X offset, not");
    echo("        by height. They also do NOT clear the inboard-hole nut clash");
    echo("        below, which is on the UNDERSIDE.");
}
